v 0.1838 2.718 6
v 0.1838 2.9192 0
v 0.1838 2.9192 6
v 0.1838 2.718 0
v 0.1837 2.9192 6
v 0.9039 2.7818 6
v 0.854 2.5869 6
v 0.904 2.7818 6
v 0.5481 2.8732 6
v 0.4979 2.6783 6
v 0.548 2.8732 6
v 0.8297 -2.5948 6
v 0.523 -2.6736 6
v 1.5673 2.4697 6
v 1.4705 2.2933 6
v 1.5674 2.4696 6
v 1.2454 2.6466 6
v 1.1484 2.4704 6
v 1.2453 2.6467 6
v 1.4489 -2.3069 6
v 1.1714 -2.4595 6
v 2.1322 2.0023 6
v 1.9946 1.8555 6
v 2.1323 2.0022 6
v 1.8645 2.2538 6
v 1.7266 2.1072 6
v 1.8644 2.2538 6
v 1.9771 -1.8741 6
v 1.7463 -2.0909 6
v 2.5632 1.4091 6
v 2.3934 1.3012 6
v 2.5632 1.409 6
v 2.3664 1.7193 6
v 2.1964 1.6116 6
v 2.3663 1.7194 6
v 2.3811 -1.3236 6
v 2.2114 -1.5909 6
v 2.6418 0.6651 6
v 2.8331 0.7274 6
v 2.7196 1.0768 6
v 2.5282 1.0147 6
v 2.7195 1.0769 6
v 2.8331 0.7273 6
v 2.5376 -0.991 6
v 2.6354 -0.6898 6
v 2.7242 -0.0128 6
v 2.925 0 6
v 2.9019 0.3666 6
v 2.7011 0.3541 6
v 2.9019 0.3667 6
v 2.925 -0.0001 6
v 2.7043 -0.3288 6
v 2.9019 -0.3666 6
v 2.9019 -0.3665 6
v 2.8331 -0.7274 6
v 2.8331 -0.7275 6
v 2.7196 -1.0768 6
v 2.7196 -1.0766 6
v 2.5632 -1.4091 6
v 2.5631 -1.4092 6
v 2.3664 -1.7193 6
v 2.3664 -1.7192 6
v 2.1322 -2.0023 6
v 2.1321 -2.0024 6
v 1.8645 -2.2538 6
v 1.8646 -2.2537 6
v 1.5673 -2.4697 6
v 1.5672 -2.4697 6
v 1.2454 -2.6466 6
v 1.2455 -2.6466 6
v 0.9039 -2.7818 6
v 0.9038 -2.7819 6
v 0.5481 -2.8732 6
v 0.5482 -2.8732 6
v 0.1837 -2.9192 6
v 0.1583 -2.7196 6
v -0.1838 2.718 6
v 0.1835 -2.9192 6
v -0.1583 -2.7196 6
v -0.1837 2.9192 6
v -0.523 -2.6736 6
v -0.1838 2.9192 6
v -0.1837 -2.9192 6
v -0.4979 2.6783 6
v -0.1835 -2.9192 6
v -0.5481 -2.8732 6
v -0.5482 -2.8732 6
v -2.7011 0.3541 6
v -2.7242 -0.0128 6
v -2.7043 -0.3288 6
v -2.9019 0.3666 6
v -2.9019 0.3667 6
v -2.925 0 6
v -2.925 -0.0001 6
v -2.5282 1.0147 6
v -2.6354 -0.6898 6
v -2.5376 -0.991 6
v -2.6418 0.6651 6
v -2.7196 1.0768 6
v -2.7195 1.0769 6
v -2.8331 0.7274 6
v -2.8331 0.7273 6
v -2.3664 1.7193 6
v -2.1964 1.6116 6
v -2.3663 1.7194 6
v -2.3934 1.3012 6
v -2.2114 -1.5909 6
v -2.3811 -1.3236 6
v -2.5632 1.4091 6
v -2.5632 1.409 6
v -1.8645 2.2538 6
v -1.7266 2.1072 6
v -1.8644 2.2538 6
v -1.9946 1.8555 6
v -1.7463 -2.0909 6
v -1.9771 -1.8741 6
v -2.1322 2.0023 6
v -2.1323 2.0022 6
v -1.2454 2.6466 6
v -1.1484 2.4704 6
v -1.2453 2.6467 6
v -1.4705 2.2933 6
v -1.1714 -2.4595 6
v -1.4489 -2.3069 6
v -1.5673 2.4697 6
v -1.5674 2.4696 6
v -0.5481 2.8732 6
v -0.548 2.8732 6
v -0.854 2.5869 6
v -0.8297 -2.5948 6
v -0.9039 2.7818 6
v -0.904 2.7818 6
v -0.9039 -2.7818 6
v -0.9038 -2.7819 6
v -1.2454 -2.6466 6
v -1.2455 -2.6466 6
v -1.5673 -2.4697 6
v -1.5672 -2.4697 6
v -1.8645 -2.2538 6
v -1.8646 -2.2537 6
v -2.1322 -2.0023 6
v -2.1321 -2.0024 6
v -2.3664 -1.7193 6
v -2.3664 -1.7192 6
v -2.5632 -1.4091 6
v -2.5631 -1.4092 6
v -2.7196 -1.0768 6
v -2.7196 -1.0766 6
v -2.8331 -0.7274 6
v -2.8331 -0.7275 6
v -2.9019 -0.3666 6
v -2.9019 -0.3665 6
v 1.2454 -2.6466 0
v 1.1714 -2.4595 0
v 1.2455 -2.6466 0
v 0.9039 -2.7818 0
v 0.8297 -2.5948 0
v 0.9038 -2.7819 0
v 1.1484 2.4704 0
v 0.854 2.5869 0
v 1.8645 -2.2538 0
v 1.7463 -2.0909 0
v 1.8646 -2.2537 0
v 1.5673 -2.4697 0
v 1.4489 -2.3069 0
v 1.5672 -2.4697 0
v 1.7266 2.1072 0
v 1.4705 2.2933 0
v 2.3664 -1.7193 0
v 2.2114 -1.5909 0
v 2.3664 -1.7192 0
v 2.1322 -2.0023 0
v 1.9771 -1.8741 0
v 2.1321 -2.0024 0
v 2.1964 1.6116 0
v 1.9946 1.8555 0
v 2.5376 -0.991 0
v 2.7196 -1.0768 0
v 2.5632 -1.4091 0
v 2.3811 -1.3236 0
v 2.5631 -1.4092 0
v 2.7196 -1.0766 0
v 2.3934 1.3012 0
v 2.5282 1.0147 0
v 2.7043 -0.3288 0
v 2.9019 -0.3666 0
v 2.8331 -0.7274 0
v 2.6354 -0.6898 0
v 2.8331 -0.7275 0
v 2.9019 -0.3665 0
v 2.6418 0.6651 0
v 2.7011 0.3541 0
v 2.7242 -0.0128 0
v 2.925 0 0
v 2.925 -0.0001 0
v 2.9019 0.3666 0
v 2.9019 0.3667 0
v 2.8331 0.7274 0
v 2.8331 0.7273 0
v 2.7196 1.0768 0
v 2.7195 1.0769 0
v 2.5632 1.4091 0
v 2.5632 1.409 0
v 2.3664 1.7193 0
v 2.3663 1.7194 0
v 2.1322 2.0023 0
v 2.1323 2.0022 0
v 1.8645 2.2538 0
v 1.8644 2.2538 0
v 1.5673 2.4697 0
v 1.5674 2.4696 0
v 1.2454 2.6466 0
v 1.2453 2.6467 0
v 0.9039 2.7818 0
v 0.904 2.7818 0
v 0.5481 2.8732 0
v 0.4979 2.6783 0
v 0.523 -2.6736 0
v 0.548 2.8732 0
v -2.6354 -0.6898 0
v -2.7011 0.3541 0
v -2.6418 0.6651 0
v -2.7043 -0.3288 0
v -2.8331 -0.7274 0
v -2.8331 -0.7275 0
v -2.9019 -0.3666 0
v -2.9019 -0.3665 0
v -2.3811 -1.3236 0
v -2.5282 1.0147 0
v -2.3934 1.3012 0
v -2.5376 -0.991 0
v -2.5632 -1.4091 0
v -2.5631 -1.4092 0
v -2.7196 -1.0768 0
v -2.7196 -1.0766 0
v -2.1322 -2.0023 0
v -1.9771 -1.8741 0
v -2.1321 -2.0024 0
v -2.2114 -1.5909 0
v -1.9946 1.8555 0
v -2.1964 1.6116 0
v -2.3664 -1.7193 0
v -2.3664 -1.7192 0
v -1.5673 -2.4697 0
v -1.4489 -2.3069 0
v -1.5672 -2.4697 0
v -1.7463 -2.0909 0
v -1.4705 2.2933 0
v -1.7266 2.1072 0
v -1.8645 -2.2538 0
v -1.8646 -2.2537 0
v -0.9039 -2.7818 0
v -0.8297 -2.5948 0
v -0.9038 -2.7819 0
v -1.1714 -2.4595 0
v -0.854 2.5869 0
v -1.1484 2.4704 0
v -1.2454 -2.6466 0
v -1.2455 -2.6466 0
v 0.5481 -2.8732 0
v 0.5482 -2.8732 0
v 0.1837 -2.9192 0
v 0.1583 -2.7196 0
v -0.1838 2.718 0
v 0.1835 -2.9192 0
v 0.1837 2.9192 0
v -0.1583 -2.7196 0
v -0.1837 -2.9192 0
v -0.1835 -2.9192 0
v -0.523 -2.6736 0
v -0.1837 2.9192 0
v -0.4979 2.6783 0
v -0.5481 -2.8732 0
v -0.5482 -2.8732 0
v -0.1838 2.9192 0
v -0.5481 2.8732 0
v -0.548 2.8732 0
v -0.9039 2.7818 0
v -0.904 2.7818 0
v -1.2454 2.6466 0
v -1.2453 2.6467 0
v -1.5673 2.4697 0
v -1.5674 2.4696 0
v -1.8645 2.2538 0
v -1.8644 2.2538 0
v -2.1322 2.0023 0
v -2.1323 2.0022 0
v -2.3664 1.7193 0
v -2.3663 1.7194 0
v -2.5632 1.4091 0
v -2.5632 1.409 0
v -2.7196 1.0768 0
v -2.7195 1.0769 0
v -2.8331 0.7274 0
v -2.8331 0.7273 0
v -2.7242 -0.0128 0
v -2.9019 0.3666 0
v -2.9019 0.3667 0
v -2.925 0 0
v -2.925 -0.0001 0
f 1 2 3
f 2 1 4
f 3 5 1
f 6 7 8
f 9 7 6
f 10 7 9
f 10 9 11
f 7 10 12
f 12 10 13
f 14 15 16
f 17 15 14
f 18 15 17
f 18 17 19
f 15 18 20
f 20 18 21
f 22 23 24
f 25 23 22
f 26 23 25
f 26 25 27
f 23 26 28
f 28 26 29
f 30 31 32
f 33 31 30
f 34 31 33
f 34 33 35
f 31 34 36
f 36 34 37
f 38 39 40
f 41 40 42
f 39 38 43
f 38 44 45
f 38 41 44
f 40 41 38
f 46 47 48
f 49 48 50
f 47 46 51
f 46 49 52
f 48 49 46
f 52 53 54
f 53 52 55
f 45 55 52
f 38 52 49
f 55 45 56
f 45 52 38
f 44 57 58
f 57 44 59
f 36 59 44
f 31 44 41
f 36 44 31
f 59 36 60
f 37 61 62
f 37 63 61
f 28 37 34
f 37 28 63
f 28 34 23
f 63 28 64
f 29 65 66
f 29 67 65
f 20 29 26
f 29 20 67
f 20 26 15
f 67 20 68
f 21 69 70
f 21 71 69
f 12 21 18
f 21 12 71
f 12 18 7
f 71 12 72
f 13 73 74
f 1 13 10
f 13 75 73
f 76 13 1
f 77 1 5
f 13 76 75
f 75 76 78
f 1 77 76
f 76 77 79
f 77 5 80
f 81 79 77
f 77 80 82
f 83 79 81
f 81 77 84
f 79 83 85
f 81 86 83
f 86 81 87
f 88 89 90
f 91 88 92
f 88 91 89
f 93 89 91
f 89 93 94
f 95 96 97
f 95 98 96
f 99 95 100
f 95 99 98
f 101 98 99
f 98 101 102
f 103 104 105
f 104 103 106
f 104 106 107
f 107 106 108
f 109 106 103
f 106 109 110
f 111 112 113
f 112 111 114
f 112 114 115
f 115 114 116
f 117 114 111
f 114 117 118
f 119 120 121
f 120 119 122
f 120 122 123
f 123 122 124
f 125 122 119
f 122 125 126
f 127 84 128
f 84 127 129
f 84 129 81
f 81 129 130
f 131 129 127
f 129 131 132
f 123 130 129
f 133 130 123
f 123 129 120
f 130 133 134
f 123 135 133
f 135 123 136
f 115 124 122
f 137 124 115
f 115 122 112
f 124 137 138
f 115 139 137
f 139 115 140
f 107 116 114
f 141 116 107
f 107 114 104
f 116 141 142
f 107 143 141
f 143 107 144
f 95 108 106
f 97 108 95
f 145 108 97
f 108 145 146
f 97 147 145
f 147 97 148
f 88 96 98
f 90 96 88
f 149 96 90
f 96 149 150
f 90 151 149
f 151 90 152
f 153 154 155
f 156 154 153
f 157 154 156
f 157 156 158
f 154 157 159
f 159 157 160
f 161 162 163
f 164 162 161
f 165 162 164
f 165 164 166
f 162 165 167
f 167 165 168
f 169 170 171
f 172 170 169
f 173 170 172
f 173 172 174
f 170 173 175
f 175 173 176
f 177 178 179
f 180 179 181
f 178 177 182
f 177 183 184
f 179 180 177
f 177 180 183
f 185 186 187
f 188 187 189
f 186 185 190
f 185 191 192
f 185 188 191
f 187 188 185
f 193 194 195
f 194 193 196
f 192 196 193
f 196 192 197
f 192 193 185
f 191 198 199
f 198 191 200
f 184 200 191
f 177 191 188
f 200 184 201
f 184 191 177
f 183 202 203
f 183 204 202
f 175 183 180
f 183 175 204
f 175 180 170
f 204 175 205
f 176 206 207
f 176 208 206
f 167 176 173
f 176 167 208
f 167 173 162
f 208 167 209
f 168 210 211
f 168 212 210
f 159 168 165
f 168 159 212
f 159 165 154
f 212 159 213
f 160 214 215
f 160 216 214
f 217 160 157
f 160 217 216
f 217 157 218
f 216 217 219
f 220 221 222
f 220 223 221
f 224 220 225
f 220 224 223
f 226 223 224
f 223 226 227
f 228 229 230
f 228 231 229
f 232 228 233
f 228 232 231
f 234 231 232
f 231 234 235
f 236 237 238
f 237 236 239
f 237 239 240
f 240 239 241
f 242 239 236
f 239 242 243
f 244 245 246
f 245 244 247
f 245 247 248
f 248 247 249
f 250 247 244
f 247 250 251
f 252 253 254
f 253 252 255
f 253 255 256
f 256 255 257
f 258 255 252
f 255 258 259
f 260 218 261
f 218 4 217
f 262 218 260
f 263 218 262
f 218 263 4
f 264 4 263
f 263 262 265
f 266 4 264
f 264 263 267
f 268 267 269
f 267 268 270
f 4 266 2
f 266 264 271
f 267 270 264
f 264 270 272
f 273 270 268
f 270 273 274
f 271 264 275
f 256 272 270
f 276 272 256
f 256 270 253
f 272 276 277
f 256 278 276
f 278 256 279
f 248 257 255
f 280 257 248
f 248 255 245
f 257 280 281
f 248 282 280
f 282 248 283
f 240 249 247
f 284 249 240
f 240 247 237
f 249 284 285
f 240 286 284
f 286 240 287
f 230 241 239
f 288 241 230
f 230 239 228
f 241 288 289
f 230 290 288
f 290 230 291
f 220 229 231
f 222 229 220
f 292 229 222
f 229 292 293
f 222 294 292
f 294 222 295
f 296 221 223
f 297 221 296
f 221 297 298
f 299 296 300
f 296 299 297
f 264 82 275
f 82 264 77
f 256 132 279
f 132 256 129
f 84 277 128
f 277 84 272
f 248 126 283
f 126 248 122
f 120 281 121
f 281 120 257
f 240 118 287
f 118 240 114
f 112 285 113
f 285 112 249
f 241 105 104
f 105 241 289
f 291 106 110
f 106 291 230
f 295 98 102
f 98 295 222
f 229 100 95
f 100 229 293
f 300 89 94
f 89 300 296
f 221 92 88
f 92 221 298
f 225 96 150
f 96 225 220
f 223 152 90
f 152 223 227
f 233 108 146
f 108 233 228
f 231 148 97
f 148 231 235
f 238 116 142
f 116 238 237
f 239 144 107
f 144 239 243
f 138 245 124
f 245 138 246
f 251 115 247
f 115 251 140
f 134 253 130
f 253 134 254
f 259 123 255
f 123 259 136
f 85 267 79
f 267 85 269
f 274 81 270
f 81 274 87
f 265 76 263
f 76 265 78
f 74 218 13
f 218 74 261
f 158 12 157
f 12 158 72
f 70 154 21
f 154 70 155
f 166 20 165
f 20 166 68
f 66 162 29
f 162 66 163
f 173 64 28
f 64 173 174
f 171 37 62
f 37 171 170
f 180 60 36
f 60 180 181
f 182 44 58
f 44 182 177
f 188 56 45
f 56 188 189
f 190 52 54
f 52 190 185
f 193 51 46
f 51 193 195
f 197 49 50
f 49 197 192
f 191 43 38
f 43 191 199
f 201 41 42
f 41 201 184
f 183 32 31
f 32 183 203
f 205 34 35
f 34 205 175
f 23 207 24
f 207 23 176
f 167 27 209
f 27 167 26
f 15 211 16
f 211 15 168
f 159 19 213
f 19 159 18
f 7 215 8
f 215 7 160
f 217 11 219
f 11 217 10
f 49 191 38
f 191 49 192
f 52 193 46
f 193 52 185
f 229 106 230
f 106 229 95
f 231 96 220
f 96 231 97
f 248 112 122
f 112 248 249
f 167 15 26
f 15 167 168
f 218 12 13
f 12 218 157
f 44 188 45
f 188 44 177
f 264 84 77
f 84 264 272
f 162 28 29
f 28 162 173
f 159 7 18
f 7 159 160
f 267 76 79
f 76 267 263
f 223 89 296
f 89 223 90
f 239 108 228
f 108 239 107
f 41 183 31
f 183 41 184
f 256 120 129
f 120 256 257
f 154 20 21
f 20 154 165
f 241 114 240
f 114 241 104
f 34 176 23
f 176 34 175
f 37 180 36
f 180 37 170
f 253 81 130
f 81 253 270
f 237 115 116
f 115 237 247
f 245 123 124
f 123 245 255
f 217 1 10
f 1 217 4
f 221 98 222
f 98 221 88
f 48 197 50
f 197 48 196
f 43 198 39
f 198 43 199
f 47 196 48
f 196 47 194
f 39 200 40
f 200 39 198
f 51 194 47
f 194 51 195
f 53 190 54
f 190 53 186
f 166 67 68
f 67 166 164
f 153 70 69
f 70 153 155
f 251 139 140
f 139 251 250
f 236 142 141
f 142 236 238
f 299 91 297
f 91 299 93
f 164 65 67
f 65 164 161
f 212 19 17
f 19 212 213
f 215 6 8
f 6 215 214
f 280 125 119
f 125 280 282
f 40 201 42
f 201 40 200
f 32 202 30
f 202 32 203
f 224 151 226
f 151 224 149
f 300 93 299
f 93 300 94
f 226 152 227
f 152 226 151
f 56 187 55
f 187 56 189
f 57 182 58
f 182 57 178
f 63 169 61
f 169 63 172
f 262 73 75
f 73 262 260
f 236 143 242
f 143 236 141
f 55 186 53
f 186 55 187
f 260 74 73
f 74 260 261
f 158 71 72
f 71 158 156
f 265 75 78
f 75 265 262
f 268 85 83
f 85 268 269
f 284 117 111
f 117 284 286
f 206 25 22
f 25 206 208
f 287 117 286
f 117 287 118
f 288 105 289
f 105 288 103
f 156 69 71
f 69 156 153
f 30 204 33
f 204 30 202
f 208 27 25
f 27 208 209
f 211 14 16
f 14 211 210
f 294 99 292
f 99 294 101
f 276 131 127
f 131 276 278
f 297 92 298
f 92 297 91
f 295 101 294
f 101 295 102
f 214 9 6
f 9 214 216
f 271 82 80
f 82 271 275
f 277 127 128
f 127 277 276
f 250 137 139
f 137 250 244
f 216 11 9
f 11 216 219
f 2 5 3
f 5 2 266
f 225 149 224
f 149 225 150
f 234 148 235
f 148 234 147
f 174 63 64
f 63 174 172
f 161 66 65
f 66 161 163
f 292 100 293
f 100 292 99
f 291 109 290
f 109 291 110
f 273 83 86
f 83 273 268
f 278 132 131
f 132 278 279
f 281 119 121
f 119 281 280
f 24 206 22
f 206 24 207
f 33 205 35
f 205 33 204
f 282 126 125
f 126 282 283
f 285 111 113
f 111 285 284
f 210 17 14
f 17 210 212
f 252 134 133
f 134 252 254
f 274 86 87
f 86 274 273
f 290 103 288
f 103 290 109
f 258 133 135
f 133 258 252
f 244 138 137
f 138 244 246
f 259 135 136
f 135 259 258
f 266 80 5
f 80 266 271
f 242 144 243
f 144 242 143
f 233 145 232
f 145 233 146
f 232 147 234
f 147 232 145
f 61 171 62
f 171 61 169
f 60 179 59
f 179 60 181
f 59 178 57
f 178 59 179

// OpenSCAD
module spline(outer, inner, teeth, height, tolerance) {
  circ = outer*3.14159;
  tooth = circ/(teeth*2);
  toothangle = 360/teeth;

  difference() {
    union(){
      cylinder(r=inner/2,h=height, $fn=50);
      for(i=[0:teeth]) {
        rotate([0,0,i*toothangle]) translate([-tooth/2,1,0]) cube([tooth,outer/2,height]);
      }
    }
    difference() {
      cylinder(r=outer,h=height, $fn=50);
      cylinder(r=outer/2,h=height, $fn=50);
    }
  }
}

spline(5.85,5.45,25,6,0);
